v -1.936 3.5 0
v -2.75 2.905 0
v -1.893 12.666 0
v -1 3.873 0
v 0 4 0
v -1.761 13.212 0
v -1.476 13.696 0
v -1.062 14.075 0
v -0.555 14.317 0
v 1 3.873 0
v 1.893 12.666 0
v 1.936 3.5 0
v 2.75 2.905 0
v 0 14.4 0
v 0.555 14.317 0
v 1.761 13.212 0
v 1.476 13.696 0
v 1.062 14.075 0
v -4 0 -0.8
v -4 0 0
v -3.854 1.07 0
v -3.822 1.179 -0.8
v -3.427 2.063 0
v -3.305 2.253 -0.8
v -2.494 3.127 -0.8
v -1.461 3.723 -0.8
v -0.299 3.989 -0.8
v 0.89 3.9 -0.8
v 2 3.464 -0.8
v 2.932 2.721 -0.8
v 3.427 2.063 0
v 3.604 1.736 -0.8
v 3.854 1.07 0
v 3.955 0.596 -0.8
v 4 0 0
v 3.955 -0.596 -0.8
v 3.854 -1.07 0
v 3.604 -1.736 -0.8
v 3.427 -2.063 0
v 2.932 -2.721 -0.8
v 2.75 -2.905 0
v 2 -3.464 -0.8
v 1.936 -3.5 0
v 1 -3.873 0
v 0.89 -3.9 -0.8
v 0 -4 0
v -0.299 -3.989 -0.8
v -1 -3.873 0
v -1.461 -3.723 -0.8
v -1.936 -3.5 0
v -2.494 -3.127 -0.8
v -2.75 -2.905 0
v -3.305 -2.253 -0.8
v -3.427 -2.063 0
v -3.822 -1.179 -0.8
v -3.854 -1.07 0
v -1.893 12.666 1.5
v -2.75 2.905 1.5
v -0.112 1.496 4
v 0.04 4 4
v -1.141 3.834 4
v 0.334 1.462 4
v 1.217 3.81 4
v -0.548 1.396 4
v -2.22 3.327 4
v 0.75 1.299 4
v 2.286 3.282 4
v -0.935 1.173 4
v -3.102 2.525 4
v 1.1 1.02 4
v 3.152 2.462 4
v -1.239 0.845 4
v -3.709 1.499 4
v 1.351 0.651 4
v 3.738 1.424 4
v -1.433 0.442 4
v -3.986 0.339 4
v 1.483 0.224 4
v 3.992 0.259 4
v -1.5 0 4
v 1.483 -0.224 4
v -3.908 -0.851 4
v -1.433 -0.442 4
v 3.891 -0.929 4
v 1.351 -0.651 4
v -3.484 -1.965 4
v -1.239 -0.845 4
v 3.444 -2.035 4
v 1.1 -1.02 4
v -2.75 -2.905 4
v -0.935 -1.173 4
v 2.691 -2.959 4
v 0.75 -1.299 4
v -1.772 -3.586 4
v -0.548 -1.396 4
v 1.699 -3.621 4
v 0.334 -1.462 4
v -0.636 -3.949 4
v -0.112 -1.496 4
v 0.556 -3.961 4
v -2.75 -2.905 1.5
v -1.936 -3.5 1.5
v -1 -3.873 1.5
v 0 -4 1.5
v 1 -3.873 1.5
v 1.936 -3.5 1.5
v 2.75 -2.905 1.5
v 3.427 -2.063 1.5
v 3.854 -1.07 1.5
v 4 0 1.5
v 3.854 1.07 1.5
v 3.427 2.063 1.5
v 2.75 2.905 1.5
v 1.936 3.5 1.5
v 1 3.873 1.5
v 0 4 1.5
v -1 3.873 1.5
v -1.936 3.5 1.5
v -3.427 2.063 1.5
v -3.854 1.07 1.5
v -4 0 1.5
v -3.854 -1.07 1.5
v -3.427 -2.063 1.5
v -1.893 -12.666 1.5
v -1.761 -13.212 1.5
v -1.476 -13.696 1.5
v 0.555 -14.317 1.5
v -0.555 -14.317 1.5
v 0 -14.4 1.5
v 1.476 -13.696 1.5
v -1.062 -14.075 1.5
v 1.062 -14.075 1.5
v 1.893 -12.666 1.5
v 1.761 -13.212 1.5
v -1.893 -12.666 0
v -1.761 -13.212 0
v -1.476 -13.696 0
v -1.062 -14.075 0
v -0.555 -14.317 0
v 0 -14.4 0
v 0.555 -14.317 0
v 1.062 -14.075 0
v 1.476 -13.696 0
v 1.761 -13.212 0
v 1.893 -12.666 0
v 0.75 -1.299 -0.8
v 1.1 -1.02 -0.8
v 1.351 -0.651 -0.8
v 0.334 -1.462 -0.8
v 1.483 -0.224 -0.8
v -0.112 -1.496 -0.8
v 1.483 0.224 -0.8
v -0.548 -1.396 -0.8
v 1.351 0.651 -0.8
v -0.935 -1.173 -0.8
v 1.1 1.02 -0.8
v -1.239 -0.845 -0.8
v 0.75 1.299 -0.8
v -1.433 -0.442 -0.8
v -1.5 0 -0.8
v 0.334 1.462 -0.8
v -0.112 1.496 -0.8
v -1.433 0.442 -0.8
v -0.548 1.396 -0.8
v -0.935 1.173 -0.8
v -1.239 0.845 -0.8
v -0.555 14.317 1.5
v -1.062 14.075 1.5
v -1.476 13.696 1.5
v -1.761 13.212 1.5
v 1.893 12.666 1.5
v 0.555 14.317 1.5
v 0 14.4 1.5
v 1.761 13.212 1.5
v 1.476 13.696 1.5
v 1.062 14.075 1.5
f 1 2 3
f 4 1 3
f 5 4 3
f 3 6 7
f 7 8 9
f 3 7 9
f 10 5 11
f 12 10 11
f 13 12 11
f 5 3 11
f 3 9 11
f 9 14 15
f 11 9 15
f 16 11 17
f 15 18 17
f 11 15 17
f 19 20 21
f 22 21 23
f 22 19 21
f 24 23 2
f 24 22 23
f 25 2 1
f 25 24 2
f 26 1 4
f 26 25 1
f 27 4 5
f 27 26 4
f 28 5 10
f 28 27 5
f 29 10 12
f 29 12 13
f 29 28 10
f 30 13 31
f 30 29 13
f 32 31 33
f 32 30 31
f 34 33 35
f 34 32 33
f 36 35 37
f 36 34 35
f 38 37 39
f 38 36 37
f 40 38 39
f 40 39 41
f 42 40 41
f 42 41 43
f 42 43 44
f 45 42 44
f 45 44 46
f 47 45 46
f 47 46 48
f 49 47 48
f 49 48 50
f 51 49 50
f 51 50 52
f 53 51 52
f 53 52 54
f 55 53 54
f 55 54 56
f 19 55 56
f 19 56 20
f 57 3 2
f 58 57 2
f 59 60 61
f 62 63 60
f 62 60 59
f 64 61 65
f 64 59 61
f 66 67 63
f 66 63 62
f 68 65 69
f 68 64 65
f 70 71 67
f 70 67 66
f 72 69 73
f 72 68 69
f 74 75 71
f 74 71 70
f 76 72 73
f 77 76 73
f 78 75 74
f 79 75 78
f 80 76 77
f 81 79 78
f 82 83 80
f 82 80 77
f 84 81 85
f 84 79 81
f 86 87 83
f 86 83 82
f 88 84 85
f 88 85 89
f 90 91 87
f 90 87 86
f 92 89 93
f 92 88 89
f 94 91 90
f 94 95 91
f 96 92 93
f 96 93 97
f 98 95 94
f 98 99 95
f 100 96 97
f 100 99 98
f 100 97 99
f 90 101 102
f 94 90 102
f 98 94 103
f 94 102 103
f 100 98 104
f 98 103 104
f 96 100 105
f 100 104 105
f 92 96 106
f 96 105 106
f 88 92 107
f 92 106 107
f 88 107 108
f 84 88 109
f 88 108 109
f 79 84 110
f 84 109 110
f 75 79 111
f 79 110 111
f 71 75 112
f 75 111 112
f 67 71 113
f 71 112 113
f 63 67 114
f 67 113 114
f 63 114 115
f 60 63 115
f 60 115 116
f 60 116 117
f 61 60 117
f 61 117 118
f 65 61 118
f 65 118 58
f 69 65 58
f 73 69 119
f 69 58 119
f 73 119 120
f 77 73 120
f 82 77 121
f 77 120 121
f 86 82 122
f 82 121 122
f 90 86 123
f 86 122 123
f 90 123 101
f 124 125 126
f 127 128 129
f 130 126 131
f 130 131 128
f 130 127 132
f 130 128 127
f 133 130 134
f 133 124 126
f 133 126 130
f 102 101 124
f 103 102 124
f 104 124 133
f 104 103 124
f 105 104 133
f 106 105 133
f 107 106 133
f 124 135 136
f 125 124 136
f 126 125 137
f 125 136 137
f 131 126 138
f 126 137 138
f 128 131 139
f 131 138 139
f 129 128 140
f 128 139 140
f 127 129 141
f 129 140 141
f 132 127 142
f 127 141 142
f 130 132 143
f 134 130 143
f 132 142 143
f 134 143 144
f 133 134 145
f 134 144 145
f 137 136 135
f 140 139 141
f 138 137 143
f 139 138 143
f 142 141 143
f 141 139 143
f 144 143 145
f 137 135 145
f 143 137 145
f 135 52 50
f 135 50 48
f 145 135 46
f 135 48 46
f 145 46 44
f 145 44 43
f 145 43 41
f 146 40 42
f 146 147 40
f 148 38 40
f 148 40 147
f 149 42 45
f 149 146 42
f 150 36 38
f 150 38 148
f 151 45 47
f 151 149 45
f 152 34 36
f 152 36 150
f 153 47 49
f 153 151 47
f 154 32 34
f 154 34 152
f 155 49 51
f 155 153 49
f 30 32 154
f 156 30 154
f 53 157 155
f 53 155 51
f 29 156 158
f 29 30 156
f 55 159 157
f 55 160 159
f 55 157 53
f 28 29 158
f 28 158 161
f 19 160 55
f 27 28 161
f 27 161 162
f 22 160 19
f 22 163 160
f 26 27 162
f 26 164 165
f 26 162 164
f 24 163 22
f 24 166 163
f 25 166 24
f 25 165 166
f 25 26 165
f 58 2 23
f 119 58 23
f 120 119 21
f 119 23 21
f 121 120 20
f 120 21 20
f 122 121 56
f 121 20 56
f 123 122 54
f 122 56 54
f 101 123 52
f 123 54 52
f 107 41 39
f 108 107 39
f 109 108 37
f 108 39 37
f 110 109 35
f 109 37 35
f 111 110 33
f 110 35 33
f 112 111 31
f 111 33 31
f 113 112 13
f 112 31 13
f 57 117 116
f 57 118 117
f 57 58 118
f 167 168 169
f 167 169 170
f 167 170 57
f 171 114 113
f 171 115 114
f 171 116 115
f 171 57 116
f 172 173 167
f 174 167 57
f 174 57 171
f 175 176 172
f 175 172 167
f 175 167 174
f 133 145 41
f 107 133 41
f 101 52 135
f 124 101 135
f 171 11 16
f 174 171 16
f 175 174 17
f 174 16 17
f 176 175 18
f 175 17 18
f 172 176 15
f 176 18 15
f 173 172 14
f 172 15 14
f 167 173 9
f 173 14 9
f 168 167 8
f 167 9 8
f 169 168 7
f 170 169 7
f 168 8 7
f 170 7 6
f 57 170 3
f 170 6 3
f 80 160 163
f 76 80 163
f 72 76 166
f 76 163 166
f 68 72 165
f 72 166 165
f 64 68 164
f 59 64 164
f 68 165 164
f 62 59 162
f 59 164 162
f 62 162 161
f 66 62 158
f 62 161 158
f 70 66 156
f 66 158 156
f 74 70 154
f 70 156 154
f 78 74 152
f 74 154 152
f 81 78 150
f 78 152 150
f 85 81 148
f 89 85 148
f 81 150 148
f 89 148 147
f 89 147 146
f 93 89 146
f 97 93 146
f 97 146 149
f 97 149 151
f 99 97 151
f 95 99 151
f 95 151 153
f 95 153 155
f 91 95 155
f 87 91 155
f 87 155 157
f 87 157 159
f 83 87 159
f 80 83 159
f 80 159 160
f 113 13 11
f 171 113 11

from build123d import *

# Parameters (mm, degrees)
BOSS_EXTRUDE1_DEPTH = 1.5
SKETCH2_R           = 4
BOSS_EXTRUDE2_DEPTH = 2.5
BOSS_EXTRUDE3_START = 0.8
SKETCH3_R           = 4
BOSS_EXTRUDE3_DEPTH = 0.8
SKETCH4_R           = 1.5
CUT_EXTRUDE1_DEPTH  = 16.697133496


with BuildPart() as part:
    # Sketch1 → Boss-Extrude1 (new body)
    with BuildSketch(Plane.XY):
        with BuildLine():
            Line((-1.892714844, 12.666224303), (-2.75, 2.90473751))
            ThreePointArc((-2.75, 2.90473751), (-4, 0), (-2.75, -2.90473751))
            Line((-2.75, -2.90473751), (-1.892714844, -12.666224303))
            ThreePointArc((-1.892714844, -12.666224303), (0, -14.4), (1.892714844, -12.666224303))
            Line((1.892714844, -12.666224303), (2.75, -2.90473751))
            ThreePointArc((2.75, -2.90473751), (4, 0), (2.75, 2.90473751))
            Line((2.75, 2.90473751), (1.892714844, 12.666224303))
            ThreePointArc((1.892714844, 12.666224303), (0, 14.4), (-1.892714844, 12.666224303))
        make_face()
    extrude(amount=BOSS_EXTRUDE1_DEPTH)

    # Sketch2 → Boss-Extrude2 (add)
    with BuildSketch(Plane.XY.offset(1.5)):
        Circle(SKETCH2_R)
    extrude(amount=BOSS_EXTRUDE2_DEPTH)

    # Sketch3 → Boss-Extrude3 (add)
    with BuildSketch(Plane(origin=(0, 0, 0), x_dir=(-1, 0, 0), z_dir=(0, 0, -1)).offset(BOSS_EXTRUDE3_START)):
        Circle(SKETCH3_R)
    extrude(amount=-BOSS_EXTRUDE3_DEPTH)

    # Sketch4 → Cut-Extrude1 (cut, through all)
    with BuildSketch(Plane(origin=(0, 0, -0.8), x_dir=(-1, 0, 0), z_dir=(0, 0, -1))):
        Circle(SKETCH4_R)
    extrude(amount=-CUT_EXTRUDE1_DEPTH, mode=Mode.SUBTRACT)


solid = part.part
